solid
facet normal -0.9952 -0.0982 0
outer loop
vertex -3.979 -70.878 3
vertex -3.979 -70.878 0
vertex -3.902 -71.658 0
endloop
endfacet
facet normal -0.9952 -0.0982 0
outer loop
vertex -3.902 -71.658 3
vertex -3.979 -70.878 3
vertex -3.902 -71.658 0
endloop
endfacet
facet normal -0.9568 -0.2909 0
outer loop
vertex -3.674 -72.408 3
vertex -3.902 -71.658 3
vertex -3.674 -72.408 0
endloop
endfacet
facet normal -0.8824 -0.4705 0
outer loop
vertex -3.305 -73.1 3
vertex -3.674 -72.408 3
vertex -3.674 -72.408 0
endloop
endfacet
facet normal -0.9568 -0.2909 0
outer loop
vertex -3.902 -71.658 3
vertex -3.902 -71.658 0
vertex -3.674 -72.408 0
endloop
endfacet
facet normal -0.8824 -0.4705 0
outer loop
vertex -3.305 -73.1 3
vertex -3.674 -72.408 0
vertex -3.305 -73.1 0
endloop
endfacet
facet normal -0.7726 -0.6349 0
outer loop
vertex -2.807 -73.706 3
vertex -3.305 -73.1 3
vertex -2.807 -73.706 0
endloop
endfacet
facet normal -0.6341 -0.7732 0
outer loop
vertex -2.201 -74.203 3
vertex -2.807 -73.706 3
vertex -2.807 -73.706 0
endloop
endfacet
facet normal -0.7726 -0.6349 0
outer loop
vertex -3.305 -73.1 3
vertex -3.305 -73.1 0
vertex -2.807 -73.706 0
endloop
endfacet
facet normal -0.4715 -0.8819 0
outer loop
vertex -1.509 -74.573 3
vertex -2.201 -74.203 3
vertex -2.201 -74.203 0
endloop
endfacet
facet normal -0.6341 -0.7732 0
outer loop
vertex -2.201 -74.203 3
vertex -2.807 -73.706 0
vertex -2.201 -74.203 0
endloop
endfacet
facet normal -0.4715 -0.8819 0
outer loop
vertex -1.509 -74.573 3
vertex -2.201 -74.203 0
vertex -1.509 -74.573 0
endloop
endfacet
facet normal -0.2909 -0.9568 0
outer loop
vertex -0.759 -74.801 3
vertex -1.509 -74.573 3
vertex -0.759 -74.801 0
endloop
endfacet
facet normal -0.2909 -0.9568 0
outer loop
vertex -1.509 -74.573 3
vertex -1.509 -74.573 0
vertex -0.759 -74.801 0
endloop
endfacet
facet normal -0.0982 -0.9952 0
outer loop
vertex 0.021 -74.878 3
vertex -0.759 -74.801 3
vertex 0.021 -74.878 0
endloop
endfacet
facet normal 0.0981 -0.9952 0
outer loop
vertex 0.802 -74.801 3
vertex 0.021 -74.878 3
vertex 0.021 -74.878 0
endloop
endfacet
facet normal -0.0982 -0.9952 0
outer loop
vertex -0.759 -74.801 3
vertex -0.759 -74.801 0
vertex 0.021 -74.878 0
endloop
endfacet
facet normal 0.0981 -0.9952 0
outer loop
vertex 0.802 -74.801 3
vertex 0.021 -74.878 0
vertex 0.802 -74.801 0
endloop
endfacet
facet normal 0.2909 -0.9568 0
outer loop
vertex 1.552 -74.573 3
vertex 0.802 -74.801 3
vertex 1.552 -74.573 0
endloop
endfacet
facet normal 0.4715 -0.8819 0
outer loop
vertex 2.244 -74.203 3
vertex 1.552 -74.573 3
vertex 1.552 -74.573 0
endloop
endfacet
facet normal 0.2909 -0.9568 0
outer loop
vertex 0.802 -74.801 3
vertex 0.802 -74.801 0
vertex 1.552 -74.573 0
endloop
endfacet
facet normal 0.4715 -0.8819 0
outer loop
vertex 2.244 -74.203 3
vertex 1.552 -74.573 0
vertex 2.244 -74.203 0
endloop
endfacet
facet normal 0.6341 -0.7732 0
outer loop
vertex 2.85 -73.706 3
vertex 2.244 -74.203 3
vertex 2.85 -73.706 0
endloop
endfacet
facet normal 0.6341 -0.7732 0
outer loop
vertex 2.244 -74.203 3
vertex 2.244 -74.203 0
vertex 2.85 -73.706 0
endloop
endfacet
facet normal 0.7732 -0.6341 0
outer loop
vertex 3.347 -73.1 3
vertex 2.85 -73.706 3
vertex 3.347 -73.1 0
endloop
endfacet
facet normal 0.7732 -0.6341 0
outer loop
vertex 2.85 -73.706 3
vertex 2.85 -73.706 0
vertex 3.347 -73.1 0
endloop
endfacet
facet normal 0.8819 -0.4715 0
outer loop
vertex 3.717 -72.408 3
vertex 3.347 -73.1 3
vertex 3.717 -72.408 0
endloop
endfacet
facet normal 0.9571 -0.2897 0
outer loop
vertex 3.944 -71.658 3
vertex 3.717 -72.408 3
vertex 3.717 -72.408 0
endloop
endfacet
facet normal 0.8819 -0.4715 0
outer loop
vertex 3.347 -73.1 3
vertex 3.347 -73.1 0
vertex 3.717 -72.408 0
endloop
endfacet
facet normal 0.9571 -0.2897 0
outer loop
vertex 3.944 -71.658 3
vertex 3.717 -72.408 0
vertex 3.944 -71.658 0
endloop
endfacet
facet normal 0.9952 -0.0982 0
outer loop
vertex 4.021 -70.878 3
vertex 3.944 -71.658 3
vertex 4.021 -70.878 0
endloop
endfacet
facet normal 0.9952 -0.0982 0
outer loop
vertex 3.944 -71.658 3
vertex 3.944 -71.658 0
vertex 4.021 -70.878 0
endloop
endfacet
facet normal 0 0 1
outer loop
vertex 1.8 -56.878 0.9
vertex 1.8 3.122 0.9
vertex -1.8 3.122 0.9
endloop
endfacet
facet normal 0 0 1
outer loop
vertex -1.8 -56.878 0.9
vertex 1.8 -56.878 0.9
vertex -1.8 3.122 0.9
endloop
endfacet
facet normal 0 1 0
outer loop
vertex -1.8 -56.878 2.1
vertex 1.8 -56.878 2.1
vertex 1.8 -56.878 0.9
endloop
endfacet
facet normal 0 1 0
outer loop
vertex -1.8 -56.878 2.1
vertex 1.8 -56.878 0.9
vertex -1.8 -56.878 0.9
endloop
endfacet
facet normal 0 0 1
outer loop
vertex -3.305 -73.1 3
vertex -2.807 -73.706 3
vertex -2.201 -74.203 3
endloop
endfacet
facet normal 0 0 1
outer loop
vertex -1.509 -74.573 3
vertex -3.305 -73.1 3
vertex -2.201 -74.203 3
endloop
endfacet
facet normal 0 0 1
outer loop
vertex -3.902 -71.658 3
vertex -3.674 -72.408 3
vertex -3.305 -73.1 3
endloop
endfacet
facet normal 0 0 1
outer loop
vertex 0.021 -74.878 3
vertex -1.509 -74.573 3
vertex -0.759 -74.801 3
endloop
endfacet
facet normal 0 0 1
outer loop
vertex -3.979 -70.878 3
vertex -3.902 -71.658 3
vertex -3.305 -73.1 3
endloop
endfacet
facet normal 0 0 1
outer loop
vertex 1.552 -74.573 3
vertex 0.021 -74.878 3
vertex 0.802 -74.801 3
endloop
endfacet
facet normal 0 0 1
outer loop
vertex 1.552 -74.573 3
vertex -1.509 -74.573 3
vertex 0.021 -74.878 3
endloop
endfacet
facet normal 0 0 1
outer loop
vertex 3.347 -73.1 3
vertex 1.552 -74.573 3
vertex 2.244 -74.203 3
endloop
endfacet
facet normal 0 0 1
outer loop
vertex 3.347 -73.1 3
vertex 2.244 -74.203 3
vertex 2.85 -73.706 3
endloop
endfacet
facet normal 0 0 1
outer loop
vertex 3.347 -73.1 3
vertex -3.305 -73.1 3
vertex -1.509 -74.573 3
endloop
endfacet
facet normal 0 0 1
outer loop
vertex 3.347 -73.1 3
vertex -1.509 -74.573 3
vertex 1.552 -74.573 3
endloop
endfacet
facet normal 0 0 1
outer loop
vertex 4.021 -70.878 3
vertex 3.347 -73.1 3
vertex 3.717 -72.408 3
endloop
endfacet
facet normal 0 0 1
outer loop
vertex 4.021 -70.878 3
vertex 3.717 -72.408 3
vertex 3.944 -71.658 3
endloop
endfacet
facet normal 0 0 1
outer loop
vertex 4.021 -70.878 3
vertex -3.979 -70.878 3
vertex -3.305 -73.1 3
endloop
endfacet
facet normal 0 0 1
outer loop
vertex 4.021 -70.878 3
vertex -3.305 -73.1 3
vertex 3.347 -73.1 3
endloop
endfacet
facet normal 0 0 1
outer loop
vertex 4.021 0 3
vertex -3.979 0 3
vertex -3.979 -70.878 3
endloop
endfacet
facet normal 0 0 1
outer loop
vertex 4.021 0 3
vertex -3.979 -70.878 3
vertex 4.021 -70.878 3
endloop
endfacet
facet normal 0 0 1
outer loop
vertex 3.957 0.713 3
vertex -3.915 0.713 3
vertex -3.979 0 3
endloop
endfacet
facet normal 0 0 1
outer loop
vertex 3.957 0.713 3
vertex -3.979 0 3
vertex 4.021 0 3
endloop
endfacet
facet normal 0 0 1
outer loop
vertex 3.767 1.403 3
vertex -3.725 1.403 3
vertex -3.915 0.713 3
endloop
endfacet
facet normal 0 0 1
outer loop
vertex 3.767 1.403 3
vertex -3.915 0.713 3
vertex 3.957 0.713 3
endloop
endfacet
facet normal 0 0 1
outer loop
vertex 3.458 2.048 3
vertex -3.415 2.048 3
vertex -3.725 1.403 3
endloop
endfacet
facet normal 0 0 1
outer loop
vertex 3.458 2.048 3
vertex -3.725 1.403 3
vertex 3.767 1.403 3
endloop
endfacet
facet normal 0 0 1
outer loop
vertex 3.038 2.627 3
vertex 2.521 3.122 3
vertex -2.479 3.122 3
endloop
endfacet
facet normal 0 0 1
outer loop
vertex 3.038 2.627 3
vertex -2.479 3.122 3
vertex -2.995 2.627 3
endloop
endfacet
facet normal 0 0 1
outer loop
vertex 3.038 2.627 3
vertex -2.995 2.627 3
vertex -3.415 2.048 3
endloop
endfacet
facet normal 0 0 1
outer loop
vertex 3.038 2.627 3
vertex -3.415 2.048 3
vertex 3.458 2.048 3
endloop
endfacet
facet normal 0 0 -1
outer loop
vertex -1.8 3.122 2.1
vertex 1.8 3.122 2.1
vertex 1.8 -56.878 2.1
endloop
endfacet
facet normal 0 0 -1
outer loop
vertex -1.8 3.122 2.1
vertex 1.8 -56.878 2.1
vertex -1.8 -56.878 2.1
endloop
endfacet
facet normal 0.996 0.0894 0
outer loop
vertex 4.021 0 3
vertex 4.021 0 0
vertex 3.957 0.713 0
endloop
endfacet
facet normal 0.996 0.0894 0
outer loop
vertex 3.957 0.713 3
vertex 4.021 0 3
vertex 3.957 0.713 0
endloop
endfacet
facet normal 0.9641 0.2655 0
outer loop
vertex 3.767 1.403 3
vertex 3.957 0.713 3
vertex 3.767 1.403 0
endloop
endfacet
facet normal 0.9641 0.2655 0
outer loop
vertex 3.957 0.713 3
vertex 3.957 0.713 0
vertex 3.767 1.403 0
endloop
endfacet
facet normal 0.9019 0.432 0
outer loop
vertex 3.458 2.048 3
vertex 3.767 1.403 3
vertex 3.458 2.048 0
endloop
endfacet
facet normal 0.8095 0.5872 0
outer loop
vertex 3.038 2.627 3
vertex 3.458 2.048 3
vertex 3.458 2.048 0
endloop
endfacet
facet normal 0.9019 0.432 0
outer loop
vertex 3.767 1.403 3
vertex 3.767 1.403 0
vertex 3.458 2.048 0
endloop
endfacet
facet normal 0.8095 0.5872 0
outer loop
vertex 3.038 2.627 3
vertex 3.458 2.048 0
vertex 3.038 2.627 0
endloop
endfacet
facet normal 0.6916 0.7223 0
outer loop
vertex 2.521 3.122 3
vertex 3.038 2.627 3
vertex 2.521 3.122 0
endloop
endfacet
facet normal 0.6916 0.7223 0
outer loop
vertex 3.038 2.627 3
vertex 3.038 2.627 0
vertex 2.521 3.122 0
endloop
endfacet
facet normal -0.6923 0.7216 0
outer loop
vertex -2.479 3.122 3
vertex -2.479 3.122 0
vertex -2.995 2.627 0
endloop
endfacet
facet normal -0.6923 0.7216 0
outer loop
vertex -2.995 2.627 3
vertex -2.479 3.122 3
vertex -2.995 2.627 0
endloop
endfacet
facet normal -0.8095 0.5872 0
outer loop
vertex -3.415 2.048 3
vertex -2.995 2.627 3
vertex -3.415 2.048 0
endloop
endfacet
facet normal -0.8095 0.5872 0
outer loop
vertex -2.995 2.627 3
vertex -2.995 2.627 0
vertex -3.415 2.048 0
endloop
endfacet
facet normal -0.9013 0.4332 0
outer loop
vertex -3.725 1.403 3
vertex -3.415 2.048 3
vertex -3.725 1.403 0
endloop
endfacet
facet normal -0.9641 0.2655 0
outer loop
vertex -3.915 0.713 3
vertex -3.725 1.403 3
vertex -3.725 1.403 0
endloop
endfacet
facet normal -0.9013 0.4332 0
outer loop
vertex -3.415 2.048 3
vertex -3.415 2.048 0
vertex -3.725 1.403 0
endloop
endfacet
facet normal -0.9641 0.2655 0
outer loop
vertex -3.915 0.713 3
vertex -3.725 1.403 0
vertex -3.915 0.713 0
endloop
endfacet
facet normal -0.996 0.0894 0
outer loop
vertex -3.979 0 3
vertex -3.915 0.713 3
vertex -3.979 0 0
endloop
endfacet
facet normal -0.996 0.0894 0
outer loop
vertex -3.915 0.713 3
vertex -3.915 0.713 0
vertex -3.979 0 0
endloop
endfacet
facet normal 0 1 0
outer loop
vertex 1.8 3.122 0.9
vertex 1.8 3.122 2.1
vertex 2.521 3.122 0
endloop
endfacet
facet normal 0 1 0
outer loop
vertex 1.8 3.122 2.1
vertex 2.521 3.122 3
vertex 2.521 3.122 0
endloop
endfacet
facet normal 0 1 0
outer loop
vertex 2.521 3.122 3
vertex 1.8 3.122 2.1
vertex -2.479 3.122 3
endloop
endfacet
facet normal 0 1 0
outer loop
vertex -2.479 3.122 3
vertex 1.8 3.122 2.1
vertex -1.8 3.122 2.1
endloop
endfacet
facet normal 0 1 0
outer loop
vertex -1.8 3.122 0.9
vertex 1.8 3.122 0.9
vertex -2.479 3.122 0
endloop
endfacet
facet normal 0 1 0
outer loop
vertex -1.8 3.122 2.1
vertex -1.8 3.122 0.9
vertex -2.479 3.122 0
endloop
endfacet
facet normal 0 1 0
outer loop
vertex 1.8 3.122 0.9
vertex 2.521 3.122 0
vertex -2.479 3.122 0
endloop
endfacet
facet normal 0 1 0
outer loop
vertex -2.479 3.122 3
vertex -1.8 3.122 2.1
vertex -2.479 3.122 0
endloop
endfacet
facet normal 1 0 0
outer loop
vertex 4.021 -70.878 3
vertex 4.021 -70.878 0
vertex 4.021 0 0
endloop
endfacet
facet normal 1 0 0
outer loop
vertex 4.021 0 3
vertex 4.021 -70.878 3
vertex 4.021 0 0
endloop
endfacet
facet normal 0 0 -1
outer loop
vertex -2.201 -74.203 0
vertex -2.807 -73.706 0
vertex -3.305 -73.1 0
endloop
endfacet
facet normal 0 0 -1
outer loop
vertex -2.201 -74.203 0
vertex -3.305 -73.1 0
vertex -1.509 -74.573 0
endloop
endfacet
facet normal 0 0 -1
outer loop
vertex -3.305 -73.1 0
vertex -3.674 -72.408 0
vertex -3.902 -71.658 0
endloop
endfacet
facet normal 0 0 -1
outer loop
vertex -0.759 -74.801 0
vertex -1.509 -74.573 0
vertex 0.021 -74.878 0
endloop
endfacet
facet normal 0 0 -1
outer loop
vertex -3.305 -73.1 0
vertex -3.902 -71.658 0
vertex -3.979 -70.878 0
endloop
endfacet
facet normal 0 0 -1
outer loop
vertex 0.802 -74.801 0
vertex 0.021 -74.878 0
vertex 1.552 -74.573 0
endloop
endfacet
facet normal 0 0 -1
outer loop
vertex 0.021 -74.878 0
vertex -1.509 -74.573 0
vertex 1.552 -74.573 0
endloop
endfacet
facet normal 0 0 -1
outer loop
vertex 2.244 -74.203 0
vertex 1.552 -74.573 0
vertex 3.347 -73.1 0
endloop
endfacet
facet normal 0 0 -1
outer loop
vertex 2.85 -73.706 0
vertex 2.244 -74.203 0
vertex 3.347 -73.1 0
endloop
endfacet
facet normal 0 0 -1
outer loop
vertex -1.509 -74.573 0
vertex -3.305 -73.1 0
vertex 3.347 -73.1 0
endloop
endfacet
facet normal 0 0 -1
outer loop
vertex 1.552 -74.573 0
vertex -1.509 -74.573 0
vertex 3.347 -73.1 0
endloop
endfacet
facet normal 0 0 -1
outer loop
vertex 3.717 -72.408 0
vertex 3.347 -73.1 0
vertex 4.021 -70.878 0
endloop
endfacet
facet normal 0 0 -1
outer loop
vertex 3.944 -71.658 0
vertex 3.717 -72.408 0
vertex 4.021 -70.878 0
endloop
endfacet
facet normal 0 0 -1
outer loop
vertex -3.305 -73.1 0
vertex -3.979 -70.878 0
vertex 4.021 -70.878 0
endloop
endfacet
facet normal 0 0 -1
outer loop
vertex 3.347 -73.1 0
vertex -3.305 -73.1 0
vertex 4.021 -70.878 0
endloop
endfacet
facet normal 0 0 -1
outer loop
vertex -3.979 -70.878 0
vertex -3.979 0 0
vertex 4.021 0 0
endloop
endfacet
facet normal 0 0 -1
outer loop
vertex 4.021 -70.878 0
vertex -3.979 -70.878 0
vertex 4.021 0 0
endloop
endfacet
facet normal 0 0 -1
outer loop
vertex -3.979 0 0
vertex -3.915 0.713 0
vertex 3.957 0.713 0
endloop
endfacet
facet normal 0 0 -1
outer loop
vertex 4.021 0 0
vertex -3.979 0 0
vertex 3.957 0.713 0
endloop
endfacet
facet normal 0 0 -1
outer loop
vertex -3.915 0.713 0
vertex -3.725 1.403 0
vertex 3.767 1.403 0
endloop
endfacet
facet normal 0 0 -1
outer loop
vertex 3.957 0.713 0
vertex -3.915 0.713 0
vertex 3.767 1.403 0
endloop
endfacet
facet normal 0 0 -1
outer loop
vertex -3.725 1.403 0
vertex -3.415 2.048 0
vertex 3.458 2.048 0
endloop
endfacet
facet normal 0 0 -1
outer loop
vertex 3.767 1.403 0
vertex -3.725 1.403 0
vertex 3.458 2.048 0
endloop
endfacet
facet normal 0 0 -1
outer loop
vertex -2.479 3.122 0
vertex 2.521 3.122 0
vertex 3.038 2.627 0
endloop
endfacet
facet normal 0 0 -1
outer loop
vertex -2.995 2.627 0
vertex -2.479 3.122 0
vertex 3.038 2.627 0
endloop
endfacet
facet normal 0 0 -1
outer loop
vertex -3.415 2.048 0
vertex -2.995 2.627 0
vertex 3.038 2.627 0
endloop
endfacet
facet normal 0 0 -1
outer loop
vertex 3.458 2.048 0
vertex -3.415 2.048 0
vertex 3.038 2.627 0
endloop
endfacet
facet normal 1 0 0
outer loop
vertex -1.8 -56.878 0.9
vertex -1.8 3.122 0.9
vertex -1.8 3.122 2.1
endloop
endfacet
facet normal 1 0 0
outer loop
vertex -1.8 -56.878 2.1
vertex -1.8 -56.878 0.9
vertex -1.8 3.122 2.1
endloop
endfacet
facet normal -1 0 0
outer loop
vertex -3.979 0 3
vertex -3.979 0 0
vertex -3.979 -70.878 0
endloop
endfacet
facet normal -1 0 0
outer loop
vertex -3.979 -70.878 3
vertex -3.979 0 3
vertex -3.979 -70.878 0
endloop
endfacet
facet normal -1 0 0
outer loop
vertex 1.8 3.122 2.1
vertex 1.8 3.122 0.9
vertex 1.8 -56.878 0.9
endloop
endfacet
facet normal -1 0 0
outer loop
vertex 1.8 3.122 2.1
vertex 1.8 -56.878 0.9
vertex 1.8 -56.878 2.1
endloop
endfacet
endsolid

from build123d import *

# Parameters (mm, degrees)
F1_DEPTH = 3
F2_W     = 3.6
F2_H     = 1.2
F3_DEPTH = 60


with BuildPart() as f1:
    # F0 (on Top) → F1 (new body)
    with BuildSketch(Plane.XY):
        with BuildLine():
            Line((4.021343, -70.877558), (4.021343, 0))
            ThreePointArc((4.021343, 0), (3.626894, 1.732051), (2.521343, 3.122499))
            Line((2.521343, 3.122499), (-2.478657, 3.122499))
            ThreePointArc((-2.478657, 3.122499), (-3.584208, 1.732051), (-3.978657, 0))
            Line((-3.978657, 0), (-3.978657, -70.877558))
            ThreePointArc((-3.978657, -70.877558), (0.021343, -74.877558), (4.021343, -70.877558))
        make_face()
    extrude(amount=F1_DEPTH)

    # F2 (on face) → F3 (cut)
    with BuildSketch(Plane(origin=(0, 3.122499, 0), x_dir=(-1, 0, 0), z_dir=(0, 1, 0))):
        with Locations((0, 1.5)):
            Rectangle(F2_W, F2_H)
    extrude(amount=-F3_DEPTH, mode=Mode.SUBTRACT)


solid = f1.part
